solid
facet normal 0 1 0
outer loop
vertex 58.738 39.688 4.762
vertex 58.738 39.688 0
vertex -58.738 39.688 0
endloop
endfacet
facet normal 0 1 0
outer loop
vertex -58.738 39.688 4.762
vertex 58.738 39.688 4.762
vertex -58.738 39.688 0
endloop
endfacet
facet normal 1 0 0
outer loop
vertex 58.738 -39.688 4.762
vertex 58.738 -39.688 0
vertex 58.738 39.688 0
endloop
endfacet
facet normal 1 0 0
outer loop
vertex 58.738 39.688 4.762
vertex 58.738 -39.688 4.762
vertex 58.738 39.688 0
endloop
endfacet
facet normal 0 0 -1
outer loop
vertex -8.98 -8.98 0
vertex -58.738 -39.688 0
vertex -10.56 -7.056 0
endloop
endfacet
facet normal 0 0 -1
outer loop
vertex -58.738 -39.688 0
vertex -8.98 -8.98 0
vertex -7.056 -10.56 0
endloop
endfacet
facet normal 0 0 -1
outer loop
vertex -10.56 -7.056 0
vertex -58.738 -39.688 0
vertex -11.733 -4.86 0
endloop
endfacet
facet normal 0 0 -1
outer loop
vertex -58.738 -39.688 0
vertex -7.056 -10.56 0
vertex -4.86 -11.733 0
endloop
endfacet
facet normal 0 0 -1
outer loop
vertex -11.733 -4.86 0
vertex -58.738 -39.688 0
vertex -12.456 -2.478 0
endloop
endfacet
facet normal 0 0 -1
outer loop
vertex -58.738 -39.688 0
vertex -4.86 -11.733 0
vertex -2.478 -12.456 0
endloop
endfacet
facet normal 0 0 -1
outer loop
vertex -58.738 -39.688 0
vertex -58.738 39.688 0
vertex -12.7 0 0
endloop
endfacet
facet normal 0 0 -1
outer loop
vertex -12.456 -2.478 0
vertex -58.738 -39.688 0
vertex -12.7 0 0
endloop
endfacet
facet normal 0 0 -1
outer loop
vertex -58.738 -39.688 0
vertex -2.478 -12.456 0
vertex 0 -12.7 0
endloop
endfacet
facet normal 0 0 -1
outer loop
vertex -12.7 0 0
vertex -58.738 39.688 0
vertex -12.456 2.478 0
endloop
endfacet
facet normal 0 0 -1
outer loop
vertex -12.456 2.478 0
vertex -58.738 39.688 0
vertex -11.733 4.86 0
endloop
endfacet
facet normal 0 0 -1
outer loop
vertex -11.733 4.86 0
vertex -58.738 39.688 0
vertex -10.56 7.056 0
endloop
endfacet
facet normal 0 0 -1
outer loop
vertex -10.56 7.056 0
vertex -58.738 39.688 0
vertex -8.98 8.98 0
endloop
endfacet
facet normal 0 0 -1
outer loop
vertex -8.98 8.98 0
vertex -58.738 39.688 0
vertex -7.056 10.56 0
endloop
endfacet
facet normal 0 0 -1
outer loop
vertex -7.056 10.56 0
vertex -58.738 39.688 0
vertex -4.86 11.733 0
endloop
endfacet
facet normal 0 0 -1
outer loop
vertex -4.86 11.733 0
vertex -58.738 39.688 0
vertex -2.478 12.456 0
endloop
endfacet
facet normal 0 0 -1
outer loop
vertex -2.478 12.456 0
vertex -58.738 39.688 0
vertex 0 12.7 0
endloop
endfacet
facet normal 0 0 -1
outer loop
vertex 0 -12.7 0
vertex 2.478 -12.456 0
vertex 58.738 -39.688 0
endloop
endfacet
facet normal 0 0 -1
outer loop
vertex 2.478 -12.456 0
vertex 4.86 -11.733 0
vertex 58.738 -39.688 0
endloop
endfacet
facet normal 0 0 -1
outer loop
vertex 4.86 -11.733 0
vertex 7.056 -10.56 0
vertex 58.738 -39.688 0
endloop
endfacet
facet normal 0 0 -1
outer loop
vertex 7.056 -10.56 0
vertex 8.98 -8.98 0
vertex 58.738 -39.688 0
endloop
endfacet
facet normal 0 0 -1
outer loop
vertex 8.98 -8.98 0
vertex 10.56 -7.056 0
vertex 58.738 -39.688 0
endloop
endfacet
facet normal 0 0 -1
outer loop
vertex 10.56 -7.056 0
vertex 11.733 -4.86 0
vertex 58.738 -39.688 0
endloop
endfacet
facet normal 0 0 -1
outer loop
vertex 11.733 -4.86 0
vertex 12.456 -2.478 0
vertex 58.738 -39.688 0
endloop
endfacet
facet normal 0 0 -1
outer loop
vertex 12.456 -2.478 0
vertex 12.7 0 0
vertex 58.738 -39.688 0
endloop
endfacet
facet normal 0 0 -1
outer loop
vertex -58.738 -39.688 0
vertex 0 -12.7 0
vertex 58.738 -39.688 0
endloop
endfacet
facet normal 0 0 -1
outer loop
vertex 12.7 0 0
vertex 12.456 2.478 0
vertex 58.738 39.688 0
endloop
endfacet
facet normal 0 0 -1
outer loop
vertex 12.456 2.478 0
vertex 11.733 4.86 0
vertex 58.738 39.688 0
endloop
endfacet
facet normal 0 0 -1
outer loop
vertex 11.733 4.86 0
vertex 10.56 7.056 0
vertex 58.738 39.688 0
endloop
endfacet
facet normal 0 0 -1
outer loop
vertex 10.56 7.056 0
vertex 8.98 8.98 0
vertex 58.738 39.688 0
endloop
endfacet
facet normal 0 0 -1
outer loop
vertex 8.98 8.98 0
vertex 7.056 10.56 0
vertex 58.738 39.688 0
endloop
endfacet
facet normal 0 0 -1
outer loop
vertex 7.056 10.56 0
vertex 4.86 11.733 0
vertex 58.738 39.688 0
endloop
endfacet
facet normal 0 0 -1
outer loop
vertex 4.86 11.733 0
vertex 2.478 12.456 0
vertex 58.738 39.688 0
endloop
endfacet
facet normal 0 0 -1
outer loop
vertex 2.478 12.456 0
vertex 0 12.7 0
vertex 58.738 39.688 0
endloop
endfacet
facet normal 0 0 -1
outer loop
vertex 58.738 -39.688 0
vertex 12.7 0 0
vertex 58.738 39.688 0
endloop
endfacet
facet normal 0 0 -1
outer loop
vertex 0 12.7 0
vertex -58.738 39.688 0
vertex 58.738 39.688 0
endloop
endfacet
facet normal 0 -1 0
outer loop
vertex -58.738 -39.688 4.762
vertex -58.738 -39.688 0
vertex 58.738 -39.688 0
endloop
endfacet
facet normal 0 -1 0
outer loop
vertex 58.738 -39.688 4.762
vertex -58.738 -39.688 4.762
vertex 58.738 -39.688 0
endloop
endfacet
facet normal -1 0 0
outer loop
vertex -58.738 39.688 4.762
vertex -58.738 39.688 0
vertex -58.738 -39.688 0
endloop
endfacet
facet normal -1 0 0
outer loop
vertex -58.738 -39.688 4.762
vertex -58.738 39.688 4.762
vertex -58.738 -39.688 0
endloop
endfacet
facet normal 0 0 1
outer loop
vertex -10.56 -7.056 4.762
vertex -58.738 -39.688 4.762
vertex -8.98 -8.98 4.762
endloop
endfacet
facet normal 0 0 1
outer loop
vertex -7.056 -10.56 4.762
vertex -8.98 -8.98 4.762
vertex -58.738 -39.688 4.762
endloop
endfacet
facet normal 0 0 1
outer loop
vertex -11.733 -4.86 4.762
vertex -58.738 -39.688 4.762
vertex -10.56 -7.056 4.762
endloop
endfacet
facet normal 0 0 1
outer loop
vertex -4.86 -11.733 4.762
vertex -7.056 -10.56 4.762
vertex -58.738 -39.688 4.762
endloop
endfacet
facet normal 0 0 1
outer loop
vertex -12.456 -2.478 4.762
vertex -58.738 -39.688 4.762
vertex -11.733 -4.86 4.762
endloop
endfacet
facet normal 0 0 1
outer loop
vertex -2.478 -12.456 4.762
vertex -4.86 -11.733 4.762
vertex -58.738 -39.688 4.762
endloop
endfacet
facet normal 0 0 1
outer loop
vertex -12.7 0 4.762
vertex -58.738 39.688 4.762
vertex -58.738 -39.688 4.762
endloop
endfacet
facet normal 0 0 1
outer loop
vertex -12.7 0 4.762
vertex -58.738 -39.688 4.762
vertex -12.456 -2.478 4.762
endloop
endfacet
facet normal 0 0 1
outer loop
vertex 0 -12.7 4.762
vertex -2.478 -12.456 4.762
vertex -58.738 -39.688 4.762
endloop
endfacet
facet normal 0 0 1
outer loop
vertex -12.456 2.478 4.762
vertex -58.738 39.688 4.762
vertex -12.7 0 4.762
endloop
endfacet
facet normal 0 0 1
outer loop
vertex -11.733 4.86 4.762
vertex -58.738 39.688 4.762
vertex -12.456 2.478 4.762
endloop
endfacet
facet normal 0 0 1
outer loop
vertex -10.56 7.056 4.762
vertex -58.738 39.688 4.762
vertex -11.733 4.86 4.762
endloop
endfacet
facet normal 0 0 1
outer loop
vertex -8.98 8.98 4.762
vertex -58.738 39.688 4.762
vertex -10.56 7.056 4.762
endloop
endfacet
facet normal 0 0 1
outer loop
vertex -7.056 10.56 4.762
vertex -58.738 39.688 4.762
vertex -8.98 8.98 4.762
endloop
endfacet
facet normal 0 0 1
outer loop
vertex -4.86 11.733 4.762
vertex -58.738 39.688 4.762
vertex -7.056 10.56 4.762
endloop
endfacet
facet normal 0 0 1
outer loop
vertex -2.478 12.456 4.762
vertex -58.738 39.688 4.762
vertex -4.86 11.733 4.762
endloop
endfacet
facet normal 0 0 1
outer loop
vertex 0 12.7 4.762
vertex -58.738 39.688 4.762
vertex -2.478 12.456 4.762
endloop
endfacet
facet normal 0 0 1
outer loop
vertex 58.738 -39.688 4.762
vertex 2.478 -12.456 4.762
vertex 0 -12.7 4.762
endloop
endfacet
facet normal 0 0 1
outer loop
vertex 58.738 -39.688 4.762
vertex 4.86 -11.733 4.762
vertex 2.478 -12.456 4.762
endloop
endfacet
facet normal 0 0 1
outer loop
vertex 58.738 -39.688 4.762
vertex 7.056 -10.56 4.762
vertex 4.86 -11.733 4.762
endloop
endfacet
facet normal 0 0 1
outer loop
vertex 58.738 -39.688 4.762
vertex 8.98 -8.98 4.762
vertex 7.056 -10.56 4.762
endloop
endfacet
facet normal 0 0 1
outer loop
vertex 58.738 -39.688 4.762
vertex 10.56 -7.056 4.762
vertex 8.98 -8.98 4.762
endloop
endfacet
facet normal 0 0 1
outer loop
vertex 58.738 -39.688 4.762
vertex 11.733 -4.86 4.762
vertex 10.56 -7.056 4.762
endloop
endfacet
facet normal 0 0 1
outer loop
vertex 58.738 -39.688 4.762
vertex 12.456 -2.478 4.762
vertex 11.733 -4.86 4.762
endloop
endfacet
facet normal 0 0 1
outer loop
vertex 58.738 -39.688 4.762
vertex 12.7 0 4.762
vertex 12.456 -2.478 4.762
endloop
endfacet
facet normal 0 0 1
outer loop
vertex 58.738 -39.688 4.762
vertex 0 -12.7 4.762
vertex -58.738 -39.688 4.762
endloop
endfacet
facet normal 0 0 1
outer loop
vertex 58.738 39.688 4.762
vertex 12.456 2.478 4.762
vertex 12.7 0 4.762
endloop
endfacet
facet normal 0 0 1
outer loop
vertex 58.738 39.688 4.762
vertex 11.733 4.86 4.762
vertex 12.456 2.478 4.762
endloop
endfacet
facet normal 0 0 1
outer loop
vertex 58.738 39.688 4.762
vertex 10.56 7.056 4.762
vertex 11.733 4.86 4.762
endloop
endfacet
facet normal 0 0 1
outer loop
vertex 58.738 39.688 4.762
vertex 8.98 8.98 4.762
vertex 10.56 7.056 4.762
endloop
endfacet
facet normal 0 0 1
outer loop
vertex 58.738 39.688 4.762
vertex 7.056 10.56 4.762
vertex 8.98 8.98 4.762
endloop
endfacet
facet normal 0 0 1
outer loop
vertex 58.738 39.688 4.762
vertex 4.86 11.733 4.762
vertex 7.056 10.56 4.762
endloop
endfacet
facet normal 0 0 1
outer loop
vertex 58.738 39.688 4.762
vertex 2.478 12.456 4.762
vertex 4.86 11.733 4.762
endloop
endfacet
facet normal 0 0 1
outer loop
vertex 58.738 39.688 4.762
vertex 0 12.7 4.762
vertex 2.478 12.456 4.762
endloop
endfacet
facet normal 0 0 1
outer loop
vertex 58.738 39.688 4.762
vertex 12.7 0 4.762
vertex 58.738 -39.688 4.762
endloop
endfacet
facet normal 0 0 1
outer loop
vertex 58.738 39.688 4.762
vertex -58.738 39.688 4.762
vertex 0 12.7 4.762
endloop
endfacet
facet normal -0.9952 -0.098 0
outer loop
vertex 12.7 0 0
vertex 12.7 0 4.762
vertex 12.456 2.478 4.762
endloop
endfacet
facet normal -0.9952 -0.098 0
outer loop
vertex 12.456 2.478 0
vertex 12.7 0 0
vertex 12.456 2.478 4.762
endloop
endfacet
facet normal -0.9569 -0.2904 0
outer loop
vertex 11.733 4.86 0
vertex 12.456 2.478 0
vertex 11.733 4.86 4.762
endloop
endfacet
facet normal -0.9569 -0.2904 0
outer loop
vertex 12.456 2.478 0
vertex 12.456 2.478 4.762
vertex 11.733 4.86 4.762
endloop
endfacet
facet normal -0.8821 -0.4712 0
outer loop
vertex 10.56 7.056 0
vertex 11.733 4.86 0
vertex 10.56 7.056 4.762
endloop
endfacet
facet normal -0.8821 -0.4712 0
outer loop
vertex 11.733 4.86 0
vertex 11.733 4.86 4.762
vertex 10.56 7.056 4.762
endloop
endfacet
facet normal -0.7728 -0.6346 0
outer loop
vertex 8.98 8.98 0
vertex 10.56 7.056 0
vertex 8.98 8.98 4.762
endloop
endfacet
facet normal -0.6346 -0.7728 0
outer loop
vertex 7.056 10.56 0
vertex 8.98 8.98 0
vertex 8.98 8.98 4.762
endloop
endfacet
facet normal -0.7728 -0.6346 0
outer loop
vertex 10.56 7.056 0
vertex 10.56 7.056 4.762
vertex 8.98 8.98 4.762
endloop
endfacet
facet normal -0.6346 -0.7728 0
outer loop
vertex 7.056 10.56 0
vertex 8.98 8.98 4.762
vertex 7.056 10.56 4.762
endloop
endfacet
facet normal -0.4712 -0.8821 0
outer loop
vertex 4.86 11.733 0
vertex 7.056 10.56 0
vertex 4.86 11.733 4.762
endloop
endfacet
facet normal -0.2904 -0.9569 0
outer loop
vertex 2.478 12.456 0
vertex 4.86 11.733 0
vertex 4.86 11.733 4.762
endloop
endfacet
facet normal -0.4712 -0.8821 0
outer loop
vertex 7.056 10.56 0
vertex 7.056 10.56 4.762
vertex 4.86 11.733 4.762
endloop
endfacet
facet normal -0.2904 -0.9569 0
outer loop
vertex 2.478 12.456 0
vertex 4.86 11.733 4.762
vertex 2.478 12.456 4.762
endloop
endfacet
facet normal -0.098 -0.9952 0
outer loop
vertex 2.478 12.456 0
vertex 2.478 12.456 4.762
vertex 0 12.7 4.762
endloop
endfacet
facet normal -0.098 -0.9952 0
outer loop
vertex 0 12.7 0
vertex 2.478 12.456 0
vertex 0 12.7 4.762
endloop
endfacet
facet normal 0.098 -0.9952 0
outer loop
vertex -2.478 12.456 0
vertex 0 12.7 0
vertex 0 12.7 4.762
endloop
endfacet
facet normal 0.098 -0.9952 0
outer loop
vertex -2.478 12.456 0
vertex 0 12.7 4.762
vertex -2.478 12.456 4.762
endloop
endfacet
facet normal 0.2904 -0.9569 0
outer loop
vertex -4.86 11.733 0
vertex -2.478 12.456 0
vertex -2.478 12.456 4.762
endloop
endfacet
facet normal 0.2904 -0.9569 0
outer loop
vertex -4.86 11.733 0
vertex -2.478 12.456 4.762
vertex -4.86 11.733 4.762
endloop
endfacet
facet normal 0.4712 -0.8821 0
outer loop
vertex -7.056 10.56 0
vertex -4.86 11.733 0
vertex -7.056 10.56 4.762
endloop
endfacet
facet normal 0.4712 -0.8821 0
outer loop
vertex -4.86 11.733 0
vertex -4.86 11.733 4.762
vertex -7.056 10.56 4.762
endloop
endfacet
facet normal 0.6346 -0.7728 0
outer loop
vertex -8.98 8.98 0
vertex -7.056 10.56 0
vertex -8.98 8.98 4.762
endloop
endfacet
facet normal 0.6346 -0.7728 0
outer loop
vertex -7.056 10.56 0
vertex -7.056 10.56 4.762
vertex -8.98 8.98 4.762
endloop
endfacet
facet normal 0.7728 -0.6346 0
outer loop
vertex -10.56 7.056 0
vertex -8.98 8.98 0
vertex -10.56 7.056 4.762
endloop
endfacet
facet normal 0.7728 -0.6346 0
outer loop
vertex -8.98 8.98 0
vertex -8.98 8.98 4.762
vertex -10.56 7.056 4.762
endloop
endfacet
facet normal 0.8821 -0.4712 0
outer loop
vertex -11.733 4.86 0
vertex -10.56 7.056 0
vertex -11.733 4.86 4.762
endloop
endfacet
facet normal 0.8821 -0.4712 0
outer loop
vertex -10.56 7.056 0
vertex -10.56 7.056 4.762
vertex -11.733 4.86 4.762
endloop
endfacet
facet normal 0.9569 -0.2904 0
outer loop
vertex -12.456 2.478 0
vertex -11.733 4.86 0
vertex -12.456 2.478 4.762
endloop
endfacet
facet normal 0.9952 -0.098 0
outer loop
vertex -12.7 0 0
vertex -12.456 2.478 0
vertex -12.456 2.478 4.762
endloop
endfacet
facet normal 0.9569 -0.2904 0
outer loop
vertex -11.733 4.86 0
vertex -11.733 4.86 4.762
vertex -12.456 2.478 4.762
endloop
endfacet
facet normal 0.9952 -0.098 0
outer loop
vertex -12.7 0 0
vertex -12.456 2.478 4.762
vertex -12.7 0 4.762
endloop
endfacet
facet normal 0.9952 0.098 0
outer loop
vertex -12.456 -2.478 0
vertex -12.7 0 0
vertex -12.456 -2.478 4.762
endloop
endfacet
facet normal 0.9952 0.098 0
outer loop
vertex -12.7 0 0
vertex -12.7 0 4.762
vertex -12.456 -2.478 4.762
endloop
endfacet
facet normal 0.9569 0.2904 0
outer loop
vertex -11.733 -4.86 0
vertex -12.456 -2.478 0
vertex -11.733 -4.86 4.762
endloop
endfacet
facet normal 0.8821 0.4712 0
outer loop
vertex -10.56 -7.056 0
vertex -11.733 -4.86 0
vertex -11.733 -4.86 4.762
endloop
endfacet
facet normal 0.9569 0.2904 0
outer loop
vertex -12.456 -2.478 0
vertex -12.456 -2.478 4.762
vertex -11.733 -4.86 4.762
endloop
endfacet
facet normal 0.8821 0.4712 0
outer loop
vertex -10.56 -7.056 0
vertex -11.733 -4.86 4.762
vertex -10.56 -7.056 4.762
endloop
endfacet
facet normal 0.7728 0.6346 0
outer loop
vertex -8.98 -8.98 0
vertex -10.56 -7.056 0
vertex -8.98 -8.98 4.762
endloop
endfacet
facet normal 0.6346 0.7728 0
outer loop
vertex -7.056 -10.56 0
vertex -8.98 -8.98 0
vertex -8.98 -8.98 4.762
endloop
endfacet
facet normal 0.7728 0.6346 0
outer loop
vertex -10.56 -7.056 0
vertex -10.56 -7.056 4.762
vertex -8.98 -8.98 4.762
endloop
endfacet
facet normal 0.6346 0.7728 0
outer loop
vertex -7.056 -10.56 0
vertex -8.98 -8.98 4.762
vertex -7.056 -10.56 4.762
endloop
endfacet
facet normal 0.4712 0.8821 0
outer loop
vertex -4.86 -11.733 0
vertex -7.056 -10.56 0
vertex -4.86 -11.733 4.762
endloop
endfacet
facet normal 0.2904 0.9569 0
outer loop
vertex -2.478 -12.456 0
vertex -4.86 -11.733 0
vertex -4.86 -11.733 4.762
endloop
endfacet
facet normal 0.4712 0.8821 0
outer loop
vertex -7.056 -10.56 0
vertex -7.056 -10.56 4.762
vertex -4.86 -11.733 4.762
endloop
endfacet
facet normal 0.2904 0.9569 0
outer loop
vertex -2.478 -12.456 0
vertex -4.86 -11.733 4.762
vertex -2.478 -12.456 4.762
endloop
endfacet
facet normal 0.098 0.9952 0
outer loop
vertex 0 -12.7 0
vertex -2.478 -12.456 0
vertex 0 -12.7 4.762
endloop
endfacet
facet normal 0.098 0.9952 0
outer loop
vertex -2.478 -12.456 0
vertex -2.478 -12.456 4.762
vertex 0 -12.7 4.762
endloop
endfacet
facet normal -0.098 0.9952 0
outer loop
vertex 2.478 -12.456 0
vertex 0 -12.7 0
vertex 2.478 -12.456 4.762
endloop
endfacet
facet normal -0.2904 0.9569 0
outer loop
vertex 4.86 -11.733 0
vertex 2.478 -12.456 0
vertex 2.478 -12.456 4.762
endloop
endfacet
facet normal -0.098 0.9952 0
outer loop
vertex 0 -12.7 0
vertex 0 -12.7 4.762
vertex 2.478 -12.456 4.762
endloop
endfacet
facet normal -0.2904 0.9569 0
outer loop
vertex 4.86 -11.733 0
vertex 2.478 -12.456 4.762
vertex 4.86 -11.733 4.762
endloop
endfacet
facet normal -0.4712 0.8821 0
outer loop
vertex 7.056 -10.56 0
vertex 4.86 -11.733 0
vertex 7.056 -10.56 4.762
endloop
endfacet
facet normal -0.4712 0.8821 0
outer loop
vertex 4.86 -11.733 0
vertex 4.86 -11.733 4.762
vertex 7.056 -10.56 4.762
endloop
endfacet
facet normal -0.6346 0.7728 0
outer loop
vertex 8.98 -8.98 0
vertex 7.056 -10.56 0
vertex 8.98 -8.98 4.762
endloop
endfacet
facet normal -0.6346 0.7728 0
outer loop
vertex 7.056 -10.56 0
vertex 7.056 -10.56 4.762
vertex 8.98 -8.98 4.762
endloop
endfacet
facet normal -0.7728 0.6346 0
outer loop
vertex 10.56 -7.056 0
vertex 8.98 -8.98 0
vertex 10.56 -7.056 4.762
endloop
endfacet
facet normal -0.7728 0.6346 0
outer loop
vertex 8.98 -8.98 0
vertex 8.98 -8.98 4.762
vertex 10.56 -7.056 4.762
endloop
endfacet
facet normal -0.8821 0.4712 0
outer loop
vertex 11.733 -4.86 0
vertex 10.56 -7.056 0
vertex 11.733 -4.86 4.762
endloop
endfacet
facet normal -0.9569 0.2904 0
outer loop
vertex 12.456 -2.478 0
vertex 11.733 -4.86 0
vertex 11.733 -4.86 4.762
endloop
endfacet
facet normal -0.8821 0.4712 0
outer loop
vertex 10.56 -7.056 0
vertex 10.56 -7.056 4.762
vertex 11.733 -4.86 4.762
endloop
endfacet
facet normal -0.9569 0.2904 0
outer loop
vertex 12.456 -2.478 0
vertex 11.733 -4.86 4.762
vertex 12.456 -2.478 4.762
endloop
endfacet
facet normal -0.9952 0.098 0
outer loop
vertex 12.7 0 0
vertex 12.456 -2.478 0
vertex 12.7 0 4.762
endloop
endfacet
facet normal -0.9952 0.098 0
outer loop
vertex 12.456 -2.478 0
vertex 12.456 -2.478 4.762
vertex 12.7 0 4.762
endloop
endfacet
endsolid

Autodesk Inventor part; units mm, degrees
ref_plane "YZ Plane" through (0, 0, 0) normal (1, 0, 0) x (0, 1, 0)
ref_plane "XZ Plane" through (0, 0, 0) normal (0, 1, 0) x (-1, 0, 0)
ref_plane "XY Plane" through (0, 0, 0) normal (0, 0, 1) x (1, 0, 0)
sketch "Sketch1" plane through (0, 0, 0) normal (0, 0, 1) x (1, 0, 0)
  line L0 (-58.7375, -39.6875) -> (58.7375, -39.6875)
  line L1 (58.7375, -39.6875) -> (58.7375, 39.6875)
  line L2 (58.7375, 39.6875) -> (-58.7375, 39.6875)
  line L3 (-58.7375, 39.6875) -> (-58.7375, -39.6875)
  line L4 (-58.7375, -39.6875) -> (58.7375, 39.6875) construction
  line L5 (58.7375, -39.6875) -> (-58.7375, 39.6875) construction
  point P0 (0, 0)
  dimension "d0" = 117.475
  dimension "d1" = 79.375
extrude "Extrusion1" add sketch "Sketch1" along normal blind 4.7625
sketch "Sketch2" plane through (0, 0, 4.7625) normal (0, 0, 1) x (1, 0, 0)
  circle A0 centre (0, 0) radius 12.7
  dimension "d4" = 25.4
extrude "Extrusion2" cut sketch "Sketch2" against normal through all
properties part number "Back"
